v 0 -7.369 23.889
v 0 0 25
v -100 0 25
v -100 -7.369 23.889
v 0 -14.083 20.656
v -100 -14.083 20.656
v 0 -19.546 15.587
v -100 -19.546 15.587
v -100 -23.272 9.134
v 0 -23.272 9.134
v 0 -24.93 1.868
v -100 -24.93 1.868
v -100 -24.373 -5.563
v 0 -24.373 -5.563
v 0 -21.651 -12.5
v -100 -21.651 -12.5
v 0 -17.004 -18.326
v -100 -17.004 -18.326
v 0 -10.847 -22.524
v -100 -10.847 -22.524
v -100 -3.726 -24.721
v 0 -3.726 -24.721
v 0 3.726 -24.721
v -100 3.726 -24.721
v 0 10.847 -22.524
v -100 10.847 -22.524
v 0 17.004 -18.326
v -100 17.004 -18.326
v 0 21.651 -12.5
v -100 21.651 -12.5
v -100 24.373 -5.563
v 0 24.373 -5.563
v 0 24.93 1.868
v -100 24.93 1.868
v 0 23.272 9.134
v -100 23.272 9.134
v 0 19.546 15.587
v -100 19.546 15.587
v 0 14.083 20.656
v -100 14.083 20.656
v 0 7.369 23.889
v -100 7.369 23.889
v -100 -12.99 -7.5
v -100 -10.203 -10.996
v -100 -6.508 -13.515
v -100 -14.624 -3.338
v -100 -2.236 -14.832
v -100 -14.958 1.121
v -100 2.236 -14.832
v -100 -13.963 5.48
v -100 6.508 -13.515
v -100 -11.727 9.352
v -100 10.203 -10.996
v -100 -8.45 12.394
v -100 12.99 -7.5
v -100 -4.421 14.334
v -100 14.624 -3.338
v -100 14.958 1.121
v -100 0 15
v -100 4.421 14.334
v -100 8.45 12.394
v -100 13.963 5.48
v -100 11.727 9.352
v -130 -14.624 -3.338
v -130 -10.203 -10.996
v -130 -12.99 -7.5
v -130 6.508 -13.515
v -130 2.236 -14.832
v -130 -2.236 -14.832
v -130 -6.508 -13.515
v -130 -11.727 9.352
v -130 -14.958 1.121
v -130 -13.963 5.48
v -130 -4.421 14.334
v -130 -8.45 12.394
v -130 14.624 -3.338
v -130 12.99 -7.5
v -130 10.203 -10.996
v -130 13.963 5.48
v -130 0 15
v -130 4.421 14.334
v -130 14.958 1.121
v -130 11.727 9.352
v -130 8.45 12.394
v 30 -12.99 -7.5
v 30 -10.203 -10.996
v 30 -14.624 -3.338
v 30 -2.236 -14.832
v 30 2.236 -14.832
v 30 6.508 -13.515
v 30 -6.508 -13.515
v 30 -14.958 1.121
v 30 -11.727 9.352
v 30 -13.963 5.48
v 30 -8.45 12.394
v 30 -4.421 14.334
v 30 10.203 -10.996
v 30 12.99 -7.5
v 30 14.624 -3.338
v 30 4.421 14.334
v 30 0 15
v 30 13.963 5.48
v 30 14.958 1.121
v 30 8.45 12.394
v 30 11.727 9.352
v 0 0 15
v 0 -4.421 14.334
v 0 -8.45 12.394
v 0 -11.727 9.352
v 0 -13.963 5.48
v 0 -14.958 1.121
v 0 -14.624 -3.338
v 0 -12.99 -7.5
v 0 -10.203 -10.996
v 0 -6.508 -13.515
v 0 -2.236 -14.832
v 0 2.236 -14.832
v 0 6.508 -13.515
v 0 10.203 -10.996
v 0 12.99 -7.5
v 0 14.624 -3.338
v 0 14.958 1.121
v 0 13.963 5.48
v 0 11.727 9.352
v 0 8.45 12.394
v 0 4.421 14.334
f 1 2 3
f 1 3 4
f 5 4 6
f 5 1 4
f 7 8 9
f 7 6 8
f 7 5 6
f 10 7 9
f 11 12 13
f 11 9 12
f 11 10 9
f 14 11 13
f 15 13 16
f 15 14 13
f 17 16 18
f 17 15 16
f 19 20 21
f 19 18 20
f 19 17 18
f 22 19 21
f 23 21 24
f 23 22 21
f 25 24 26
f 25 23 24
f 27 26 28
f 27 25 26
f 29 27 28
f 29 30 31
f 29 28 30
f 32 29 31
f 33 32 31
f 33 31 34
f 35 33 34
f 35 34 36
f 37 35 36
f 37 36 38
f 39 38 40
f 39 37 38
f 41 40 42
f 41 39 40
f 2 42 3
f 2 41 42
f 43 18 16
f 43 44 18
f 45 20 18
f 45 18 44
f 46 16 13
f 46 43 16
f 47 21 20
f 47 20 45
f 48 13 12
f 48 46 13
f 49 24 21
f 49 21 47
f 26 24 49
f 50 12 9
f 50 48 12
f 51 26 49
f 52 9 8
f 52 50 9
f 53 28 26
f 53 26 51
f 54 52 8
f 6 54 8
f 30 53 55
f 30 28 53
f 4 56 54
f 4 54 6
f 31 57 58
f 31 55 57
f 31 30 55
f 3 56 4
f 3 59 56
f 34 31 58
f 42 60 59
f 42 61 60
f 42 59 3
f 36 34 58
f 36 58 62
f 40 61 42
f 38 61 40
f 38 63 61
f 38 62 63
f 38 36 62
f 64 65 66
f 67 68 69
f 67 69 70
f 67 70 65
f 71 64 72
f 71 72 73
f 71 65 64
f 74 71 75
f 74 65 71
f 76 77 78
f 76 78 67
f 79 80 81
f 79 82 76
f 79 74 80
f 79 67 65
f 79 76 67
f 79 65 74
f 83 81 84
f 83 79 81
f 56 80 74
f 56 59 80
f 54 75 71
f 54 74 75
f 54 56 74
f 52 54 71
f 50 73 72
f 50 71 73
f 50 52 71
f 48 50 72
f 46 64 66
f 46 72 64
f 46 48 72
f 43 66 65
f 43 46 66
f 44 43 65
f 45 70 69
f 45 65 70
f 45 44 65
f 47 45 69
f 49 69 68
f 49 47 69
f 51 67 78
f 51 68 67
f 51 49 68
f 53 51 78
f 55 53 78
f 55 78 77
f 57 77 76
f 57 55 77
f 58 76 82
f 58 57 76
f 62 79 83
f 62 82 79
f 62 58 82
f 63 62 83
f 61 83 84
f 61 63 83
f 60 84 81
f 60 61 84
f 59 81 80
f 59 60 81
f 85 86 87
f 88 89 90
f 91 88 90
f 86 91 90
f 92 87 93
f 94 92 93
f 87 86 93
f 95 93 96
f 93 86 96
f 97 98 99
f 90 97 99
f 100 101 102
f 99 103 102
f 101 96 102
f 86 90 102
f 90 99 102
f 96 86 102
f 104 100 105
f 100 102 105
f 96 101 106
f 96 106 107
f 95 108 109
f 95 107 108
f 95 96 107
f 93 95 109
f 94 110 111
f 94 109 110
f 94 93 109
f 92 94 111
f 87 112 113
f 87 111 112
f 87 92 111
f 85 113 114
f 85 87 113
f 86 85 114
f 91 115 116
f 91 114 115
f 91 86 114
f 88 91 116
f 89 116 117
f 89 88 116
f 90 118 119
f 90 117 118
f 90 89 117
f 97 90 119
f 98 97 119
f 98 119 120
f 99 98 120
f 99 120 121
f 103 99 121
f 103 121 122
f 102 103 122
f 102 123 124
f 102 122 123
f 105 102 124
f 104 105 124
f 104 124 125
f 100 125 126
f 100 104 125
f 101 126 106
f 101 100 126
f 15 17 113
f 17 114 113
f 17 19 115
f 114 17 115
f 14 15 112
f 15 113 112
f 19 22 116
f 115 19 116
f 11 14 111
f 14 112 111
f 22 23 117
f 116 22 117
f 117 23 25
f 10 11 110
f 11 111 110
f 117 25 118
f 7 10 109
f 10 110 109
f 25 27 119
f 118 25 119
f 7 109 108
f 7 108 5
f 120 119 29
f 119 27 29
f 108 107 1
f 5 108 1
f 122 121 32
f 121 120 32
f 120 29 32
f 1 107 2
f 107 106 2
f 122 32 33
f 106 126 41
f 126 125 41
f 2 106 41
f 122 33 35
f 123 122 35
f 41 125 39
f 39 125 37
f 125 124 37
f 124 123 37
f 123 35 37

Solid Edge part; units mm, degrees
sketch "Sketch1" plane through (0, 0, 0) normal (0, -1, 0) x (1, 0, 0)
  line L0 (-130, 0) -> (-130, 15)
  line L1 (-130, 15) -> (-100, 15)
  line L2 (-100, 15) -> (-100, 25)
  line L3 (-100, 25) -> (0, 25)
  line L4 (0, 25) -> (0, 15)
  line L5 (0, 15) -> (30, 15)
  line L6 (30, 15) -> (30, 0)
  dimension "D1" = 100
revolve "RevolvedProtrusion1" add sketch "Sketch1" angle 360 about axis through (14.8745, 0, 0) along (-1, 0, 0)
properties material "Steel"
